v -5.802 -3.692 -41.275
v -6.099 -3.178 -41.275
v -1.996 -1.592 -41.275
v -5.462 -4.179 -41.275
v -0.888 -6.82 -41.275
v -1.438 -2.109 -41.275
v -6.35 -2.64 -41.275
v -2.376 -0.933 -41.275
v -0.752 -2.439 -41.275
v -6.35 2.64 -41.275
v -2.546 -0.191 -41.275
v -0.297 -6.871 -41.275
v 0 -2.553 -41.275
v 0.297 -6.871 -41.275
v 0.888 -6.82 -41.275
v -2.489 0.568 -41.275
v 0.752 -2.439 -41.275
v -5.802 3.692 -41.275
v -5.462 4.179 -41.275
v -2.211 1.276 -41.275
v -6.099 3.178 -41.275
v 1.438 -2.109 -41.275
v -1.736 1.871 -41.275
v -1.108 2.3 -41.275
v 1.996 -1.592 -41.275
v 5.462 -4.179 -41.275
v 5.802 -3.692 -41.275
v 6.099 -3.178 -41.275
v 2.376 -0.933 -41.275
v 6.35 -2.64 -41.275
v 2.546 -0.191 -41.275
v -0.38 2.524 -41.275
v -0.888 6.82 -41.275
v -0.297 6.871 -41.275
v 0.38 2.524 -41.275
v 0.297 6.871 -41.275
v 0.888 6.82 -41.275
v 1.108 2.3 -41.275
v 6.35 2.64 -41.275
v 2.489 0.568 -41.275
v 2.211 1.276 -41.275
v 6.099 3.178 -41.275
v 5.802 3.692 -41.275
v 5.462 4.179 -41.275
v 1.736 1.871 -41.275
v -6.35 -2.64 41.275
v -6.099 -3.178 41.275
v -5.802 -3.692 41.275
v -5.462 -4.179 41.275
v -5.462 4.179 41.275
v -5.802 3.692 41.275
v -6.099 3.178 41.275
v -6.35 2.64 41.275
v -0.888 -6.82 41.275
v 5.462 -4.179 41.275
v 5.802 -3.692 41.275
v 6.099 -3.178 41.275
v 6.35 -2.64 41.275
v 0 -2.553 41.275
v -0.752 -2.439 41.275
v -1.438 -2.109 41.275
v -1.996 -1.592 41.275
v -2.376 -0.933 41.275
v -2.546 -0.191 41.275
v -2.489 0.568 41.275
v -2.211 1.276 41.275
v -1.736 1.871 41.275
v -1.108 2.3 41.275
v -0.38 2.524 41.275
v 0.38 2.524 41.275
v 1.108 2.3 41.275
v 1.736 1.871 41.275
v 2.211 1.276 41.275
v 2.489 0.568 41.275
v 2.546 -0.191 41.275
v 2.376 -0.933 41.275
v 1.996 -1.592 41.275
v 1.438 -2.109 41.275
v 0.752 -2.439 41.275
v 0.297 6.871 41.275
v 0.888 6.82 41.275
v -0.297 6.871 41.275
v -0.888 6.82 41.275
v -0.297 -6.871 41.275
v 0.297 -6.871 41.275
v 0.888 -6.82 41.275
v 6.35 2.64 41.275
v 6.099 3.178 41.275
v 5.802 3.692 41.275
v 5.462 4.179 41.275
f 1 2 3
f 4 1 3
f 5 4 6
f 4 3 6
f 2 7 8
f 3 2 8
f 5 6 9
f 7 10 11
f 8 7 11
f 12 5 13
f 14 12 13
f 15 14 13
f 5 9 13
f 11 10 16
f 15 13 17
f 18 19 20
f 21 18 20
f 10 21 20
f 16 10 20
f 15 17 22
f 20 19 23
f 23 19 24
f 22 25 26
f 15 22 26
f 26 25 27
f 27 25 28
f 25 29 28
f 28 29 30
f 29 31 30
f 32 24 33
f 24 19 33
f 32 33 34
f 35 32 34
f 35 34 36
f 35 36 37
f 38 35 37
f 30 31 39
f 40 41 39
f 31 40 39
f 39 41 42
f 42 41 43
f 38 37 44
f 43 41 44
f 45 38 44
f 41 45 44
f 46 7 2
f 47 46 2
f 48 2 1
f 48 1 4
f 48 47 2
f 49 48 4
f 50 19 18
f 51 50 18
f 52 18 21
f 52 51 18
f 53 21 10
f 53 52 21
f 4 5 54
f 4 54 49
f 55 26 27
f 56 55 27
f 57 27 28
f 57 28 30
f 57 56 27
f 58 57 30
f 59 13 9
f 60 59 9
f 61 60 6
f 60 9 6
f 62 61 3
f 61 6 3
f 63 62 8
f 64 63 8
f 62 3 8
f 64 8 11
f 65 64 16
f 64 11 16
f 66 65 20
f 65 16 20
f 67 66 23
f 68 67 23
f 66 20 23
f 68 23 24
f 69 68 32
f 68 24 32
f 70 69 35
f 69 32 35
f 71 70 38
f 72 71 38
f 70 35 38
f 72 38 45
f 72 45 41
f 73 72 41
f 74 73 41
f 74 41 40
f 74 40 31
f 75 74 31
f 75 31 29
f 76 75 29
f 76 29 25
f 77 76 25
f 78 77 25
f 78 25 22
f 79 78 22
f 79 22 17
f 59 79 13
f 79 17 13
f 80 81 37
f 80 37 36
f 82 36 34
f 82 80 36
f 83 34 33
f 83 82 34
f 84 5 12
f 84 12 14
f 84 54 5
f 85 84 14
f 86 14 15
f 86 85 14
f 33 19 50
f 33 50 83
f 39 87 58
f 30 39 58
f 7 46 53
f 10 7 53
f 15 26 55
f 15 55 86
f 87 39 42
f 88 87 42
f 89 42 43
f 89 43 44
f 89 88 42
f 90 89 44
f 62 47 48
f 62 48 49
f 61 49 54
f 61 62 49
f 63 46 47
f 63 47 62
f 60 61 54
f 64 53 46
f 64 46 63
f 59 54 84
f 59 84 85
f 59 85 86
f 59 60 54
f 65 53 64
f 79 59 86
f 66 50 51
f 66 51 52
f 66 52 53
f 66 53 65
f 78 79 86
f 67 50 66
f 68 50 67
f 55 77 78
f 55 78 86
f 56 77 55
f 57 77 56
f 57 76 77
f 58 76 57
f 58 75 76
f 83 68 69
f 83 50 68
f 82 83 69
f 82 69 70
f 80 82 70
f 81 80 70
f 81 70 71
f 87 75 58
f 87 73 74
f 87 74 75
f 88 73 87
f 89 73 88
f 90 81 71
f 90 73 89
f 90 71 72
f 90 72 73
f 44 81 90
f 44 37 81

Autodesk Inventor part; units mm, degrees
ref_plane "YZ Plane" through (0, 0, 0) normal (1, 0, 0) x (0, 1, 0)
ref_plane "XZ Plane" through (0, 0, 0) normal (0, 1, 0) x (-1, 0, 0)
ref_plane "XY Plane" through (0, 0, 0) normal (0, 0, 1) x (1, 0, 0)
sketch "Sketch1" plane through (0, 0, 0) normal (0, 0, 1) x (1, 0, 0)
  line L0 (-6.35, -3.6662) -> (-6.35, 3.6662)
  line L1 (-6.35, 3.6662) -> (0, 7.3323)
  line L2 (0, 7.3323) -> (6.35, 3.6662)
  line L3 (6.35, 3.6662) -> (6.35, -3.6662)
  line L4 (6.35, -3.6662) -> (0, -7.3323)
  line L5 (0, -7.3323) -> (-6.35, -3.6662)
  point P0 (0, 0)
  point P1 (0, 0)
  dimension "Size" = 12.7
extrude "Extrusion1" add sketch "Sketch1" along normal mid plane 82.55
sketch "Sketch3" plane through (0, 0, 41.275) normal (0, 0, 1) x (1, 0, 0)
  line L0 (-6.35, 3.6662) -> (0, 7.3323) construction
  line L1 (0, 7.3323) -> (6.35, 3.6662) construction
  line L2 (6.35, 3.6662) -> (6.35, -3.6662) construction
  line L3 (6.35, -3.6662) -> (0, -7.3323) construction
  line L4 (0, -7.3323) -> (-6.35, -3.6662) construction
  line L5 (-6.35, -3.6662) -> (-6.35, 3.6662) construction
  point P0 (0, 0)
hole "Hole1" at (0, 0, 41.275) direction (0, 0, -1) diameter 5.1054 end through all
sketch "Sketch4" plane through (0, 0, 41.275) normal (0, 0, 1) x (1, 0, 0)
  circle A0 centre (0, 0) radius 2.5527 construction
  line L0 (-6.35, 3.6662) -> (0, 7.3323) construction
  line L1 (0, 7.3323) -> (6.35, 3.6662) construction
  line L2 (6.35, 3.6662) -> (6.35, -3.6662) construction
  line L3 (6.35, -3.6662) -> (0, -7.3323) construction
  line L4 (0, -7.3323) -> (-6.35, -3.6662) construction
  line L5 (-6.35, -3.6662) -> (-6.35, 3.6662) construction
  circle A1 centre (0, 0) radius 6.8771
  circle A2 centre (0, 0) radius 8.89
  dimension "thunder" = 13.7541
  dimension "d16" = 17.78
extrude "Extrusion3" cut sketch "Sketch4" against normal through all
equation "\"bearing\" = 25.4"
properties part number "GP10-006" material "Aluminum 6061"
